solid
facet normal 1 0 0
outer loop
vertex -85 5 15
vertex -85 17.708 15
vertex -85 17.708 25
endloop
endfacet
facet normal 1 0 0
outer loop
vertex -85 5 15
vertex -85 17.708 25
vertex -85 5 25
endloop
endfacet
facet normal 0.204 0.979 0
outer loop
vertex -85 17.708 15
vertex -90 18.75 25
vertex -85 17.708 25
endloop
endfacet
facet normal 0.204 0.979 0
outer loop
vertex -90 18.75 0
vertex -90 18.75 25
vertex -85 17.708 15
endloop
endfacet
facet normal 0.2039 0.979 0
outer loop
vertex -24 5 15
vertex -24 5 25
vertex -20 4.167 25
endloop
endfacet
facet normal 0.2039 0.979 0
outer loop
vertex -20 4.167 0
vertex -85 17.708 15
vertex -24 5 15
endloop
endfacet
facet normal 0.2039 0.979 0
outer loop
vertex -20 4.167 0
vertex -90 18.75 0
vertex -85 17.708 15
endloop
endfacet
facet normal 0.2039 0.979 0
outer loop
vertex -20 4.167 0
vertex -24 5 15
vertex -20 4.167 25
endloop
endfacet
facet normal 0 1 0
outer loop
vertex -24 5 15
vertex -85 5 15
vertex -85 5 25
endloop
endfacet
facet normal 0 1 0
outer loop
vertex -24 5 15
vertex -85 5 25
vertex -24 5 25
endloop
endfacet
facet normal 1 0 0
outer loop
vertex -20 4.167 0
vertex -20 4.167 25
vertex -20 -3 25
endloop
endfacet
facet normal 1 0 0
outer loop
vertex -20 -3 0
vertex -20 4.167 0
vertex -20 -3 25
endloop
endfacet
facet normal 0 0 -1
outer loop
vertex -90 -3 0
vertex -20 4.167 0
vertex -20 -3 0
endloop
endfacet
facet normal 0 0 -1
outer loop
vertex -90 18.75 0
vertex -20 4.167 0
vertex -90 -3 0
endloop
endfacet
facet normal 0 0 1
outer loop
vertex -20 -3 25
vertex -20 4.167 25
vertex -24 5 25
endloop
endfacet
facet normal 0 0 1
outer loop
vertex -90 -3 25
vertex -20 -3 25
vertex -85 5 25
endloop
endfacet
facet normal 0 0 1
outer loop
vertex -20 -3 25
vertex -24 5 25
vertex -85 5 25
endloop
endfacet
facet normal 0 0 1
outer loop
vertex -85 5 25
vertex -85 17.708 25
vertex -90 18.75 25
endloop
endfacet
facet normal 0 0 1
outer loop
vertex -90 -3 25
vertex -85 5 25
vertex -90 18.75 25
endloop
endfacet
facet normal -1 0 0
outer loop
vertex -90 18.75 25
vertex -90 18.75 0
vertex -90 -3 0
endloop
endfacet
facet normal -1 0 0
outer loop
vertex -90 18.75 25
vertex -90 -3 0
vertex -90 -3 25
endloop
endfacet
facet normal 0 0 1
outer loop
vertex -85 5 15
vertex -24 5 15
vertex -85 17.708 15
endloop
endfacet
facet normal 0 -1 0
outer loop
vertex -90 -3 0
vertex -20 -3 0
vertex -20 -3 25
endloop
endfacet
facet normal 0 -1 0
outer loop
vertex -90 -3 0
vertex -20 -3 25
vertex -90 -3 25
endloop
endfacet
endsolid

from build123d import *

# Parameters (mm, degrees)
F1_DEPTH = 15
F3_DEPTH = 10
F6_DEPTH = 3
F8_DEPTH = 25


with BuildPart() as f1:
    # F0 (on Top) → F1 (new body)
    with BuildSketch(Plane.XY):
        Polygon((60, 12.5), (0, 0), (60, 0), align=None)
        Polygon((60, 12.5), (60, 0), (90, 0), (90, 18.75), align=None)
    extrude(amount=F1_DEPTH)

    # F2 (on face) → F3 (join)
    with BuildSketch(Plane.XY.offset(15)):
        Polygon((0, 0), (90, 0), (90, 18.75), (85.0000008941, 17.7083335196), (85.0000008941, 5), (24, 5), align=None)
    extrude(amount=F3_DEPTH)


with BuildPart() as f4_1:
    # F4: instance of F1
    add(f1.part.mirror(Plane.YZ))

    # F6 (add): a face of the model
    f6_faces = [f4_1.faces().sort_by_distance(p)[0] for p in [
        (-45, 0, 12.5),
    ]]
    extrude(f6_faces, amount=F6_DEPTH)

    # F7 (on face) → F8 (cut, through all)
    with BuildSketch(Plane.XY.offset(25)):
        Polygon((-20, -3), (0, -3), (0, 0), (-20, 4.1666666667), align=None)
    extrude(amount=-F8_DEPTH, mode=Mode.SUBTRACT)


solid = f4_1.part
